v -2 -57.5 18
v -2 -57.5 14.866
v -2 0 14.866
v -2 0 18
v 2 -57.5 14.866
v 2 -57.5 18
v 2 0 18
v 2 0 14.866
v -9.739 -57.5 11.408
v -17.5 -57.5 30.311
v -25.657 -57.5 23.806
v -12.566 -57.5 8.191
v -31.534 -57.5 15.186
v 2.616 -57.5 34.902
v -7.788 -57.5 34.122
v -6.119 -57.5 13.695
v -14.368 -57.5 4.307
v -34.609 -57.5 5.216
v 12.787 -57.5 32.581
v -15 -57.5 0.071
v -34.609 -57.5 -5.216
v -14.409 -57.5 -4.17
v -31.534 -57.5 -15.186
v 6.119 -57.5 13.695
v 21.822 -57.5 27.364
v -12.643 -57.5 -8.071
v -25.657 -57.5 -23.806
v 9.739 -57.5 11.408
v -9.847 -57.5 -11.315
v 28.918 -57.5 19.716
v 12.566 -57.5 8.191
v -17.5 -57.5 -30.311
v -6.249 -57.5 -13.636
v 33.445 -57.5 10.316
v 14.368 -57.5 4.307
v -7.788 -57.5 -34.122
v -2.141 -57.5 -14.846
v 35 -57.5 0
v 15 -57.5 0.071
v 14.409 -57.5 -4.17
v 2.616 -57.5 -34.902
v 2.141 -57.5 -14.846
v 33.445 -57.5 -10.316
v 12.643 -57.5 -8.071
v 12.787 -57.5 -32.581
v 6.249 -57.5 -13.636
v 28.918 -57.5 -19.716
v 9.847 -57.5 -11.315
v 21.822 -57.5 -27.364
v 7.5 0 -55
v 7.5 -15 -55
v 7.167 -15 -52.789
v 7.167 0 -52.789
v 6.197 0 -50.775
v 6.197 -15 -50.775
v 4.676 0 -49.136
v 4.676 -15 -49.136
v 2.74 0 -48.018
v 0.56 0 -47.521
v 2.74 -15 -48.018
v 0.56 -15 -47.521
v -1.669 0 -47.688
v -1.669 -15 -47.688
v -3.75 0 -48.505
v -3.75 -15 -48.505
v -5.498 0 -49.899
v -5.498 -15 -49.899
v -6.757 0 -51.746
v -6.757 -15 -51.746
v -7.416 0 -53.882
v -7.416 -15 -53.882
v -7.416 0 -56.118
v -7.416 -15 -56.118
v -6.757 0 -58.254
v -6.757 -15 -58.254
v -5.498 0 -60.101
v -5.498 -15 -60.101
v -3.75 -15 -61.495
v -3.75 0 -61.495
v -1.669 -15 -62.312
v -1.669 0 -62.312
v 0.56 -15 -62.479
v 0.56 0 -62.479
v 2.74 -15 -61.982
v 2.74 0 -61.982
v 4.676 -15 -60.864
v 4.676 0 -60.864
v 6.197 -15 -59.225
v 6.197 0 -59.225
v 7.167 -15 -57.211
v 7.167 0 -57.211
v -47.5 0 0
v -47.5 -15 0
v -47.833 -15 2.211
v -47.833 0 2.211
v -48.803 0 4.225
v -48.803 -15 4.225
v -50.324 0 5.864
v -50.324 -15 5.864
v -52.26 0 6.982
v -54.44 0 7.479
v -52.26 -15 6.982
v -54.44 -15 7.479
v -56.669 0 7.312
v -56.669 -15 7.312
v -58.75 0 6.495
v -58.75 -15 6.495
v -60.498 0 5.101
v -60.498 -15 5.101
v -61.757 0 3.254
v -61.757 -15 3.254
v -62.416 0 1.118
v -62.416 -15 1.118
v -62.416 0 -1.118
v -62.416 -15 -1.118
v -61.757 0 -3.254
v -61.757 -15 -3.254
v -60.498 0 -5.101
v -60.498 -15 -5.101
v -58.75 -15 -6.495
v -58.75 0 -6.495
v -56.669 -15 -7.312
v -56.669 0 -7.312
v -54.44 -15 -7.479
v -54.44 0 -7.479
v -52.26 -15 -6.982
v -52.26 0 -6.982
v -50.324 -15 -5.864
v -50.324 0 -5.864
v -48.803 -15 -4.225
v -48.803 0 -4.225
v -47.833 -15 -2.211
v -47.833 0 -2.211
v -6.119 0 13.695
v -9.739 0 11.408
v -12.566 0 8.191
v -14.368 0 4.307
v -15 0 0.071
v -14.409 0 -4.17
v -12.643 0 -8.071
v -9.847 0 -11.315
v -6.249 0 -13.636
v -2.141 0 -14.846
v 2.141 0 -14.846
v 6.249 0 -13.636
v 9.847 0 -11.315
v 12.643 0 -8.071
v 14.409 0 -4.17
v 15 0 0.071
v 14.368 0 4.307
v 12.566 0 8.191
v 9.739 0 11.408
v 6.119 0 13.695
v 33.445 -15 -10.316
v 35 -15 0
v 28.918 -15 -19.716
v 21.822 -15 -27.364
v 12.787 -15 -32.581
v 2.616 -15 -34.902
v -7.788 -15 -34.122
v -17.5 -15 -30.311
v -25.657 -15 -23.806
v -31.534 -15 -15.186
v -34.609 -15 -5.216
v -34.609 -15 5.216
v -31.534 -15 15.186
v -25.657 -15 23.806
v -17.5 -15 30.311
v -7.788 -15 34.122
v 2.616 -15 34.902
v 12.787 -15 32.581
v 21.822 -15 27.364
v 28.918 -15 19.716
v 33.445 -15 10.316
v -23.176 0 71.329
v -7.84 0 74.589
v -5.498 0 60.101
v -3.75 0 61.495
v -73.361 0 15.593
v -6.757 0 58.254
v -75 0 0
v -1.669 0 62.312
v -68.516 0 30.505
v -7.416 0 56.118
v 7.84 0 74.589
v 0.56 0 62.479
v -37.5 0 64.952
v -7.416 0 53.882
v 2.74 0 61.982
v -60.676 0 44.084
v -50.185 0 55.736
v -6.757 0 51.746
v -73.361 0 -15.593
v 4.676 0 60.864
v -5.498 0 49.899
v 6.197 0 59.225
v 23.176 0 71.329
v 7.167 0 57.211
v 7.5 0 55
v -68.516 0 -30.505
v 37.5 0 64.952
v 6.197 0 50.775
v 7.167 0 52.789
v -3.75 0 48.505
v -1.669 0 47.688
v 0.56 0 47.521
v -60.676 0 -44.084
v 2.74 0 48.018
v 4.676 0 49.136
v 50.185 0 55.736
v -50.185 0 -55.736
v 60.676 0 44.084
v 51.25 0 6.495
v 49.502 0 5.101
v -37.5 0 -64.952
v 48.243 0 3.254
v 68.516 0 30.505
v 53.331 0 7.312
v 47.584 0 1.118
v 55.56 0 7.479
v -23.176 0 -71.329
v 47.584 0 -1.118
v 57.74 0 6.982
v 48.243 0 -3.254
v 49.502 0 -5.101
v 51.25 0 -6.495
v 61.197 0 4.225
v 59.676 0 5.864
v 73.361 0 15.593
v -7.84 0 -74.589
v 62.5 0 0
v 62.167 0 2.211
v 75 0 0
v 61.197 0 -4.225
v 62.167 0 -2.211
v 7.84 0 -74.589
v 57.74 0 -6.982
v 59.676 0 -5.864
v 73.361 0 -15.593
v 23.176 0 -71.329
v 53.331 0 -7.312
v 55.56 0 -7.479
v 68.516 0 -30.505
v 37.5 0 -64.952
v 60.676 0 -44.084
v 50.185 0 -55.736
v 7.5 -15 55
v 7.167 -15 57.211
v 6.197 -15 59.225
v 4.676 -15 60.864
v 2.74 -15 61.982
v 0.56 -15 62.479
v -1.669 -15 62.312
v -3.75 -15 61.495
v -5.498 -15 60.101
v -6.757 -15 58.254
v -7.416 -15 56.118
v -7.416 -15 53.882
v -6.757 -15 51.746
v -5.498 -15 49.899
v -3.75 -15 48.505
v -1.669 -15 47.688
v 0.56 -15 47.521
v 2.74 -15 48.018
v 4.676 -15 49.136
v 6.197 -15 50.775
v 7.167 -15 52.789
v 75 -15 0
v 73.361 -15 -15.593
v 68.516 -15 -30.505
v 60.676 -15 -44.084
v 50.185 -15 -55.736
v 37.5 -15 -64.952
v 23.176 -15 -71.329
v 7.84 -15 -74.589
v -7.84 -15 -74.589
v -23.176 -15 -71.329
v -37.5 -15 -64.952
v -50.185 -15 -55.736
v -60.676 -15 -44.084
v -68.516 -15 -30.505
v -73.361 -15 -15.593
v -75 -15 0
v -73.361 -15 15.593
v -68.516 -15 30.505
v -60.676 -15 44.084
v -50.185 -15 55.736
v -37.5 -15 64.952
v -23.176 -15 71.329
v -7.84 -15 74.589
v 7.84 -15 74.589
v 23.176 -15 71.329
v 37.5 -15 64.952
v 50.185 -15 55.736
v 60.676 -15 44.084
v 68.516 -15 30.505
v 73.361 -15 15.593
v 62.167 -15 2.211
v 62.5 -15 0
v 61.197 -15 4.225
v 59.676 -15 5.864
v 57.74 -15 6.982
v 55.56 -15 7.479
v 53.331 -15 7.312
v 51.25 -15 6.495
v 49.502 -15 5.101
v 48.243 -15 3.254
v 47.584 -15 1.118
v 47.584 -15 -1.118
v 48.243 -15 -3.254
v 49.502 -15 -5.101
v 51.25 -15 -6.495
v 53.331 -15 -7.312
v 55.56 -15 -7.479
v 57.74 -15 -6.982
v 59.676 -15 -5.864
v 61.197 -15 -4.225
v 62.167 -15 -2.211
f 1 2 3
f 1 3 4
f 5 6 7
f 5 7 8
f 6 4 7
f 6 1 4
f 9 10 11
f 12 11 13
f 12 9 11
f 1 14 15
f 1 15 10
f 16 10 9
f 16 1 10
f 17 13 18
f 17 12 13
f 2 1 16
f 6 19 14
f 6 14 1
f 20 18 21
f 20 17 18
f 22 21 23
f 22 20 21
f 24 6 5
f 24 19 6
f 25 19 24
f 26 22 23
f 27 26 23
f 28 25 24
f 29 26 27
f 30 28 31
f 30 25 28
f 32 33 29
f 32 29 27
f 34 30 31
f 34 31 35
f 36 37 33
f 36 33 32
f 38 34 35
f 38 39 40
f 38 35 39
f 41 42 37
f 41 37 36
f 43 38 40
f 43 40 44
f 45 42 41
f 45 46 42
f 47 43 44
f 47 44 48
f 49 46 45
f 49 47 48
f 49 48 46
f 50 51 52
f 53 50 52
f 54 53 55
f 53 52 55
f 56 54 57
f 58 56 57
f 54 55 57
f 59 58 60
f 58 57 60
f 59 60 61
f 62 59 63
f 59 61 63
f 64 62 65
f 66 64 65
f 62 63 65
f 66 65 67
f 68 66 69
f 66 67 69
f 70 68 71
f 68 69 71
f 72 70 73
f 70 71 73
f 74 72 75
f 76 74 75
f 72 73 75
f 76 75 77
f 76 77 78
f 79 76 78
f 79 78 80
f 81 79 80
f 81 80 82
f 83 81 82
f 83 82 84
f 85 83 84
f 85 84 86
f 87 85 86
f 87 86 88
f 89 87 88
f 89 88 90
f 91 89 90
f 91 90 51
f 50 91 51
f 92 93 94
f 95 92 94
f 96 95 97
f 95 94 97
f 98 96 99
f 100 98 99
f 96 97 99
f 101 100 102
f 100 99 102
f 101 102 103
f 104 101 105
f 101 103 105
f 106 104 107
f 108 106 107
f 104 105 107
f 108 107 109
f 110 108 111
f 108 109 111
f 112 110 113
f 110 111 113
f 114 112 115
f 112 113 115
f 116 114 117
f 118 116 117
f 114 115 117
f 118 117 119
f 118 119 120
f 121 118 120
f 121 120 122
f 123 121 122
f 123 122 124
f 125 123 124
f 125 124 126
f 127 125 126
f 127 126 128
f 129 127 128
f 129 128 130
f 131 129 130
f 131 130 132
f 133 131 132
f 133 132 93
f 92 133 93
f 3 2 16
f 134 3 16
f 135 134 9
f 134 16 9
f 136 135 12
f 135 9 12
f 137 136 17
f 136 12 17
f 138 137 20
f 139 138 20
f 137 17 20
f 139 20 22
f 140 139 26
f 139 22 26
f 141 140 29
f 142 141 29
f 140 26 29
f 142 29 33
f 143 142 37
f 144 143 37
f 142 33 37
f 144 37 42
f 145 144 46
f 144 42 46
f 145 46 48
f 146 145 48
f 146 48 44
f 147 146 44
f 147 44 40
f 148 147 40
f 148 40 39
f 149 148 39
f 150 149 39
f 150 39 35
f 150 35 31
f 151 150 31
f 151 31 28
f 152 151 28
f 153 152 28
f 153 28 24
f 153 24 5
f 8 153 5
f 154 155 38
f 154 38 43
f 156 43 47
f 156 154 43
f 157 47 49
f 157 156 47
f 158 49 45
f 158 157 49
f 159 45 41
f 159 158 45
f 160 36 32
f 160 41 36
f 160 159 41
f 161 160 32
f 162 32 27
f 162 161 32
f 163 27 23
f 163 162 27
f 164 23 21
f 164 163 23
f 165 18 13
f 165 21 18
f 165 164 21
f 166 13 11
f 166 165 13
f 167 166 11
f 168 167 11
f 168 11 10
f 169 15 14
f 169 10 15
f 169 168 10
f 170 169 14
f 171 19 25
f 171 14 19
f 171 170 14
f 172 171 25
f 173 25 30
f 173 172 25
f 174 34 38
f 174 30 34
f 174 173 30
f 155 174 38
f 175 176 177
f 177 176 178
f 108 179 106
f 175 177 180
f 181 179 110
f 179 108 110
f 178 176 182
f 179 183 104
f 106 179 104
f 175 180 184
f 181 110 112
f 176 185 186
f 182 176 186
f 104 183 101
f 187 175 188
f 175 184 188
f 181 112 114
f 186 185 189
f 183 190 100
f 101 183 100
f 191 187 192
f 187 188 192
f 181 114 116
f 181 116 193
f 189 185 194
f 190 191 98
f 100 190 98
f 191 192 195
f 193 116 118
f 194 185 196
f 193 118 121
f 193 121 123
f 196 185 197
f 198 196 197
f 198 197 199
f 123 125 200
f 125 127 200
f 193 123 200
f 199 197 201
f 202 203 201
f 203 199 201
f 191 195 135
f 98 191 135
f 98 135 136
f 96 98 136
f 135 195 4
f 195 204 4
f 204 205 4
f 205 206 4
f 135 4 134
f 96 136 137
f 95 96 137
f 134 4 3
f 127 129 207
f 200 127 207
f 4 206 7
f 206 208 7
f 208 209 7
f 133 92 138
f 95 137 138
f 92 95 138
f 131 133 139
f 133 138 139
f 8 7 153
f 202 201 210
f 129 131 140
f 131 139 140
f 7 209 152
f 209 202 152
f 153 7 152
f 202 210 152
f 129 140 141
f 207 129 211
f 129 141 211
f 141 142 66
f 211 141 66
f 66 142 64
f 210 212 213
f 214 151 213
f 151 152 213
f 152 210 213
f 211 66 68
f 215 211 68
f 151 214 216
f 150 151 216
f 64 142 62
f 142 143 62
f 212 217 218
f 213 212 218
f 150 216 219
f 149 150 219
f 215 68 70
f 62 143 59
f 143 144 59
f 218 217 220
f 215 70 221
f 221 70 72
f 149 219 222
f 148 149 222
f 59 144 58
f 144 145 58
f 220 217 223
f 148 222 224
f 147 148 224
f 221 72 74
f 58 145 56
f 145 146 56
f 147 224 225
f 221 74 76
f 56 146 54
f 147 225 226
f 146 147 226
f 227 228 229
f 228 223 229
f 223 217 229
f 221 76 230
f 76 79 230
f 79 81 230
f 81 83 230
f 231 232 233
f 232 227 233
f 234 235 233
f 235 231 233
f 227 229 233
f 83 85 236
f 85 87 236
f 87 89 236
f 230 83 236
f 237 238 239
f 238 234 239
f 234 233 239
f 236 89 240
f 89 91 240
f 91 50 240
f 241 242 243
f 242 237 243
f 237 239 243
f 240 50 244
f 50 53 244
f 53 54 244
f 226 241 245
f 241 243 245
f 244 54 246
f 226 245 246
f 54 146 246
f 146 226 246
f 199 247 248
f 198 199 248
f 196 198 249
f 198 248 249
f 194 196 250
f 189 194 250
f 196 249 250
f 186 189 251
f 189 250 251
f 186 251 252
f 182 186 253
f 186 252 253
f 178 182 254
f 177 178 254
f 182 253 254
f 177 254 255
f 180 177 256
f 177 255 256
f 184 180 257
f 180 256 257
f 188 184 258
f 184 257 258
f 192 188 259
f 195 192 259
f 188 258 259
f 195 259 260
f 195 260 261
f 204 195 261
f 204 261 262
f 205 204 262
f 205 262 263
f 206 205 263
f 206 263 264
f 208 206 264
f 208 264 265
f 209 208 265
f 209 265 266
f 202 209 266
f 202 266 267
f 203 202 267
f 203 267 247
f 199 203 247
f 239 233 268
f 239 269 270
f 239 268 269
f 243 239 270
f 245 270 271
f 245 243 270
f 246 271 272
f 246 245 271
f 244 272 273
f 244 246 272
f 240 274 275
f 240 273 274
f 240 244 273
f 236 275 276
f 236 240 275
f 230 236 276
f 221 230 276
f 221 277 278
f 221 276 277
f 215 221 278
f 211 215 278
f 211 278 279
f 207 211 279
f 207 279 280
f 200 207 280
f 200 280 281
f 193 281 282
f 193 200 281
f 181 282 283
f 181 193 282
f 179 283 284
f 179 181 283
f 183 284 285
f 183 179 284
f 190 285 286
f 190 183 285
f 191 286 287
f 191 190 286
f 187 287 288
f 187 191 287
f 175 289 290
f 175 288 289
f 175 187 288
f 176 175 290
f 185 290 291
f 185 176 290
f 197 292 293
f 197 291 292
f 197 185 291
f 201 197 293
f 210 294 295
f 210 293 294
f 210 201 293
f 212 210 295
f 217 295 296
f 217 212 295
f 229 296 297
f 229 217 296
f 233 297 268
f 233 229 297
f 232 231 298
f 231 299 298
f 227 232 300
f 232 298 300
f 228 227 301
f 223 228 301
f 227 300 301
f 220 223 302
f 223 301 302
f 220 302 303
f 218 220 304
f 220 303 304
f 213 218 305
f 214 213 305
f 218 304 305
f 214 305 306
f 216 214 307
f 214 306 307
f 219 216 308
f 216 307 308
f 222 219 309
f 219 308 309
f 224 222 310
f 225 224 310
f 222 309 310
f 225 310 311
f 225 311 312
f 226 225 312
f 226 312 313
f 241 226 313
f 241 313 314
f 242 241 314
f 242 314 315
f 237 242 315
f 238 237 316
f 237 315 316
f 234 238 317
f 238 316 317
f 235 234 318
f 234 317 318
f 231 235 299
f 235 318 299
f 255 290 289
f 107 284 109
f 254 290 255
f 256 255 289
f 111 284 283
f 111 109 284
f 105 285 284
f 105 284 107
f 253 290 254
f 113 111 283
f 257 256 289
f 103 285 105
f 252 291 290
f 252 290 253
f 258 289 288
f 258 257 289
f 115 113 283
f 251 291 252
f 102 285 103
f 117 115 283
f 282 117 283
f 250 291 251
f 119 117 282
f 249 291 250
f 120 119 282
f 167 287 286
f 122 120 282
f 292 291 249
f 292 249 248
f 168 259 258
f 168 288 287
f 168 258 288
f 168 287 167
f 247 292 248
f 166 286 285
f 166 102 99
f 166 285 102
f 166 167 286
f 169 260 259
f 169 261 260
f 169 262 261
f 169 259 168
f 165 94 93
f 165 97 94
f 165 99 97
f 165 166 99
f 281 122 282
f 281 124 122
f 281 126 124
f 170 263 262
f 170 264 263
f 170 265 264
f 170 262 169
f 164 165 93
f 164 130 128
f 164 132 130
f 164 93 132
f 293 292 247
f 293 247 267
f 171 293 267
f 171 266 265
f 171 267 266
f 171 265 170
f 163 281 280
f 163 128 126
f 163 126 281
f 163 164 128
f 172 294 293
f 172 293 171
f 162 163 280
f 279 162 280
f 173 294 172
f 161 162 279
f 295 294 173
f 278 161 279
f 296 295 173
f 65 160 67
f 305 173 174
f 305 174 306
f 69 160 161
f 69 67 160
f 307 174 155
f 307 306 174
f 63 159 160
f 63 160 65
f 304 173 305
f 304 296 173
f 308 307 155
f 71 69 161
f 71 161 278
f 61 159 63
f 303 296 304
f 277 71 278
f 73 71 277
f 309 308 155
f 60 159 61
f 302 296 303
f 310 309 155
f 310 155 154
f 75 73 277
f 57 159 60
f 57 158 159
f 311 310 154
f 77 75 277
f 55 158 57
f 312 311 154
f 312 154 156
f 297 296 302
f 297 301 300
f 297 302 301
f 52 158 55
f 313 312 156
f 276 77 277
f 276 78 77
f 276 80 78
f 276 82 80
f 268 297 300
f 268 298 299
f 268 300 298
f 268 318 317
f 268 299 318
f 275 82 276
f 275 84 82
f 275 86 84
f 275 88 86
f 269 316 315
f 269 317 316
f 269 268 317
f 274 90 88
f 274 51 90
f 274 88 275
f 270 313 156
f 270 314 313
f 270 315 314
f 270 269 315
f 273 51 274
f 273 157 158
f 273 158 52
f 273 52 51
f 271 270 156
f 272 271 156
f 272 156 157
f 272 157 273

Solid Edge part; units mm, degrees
sketch "Sketch1" plane through (0, 0, 0) normal (0, -1, 0) x (1, 0, 0)
  circle A0 centre (0, 0) radius 75
extrude "Protrusion1" add sketch "Sketch1" along normal blind 15
sketch "Sketch2" plane through (0, -15, 0) normal (0, -1, 0) x (1, 0, 0)
  circle A0 centre (0, 0) radius 35
extrude "ExtrudedProtrusion_2" add sketch "Sketch2" along normal blind 42.5
sketch "Sketch3" plane through (0, -57.5, 0) normal (0, -1, 0) x (1, 0, 0)
  circle A0 centre (0, 0) radius 15
extrude "ExtrudedCutout_1" cut sketch "Sketch3" against normal blind 241.6449
sketch "Sketch4" plane through (0, -57.5, 0) normal (0, -1, 0) x (1, 0, 0)
  line L0 (-2, 18) -> (2, 18)
  line L1 (2, 18) -> (2, 9.189)
  line L2 (2, 9.189) -> (-2, 9.189)
  line L3 (-2, 9.189) -> (-2, 18)
  dimension "D1" = 4
  dimension "D2" = 3
extrude "ExtrudedCutout_2" cut sketch "Sketch4" against normal blind 185.7022
sketch "Sketch5" plane through (0, -15, 0) normal (0, -1, 0) x (1, 0, 0)
  circle A0 centre (55, 0) radius 7.5
  circle A1 centre (0, -55) radius 7.5
  circle A2 centre (-55, 0) radius 7.5
  circle A3 centre (0, 55) radius 7.5
  dimension "D1" = 15
  dimension "D2" = 15
  dimension "D3" = 15
extrude "ExtrudedCutout_3" cut sketch "Sketch5" against normal blind 96.4879
properties part number "2"
